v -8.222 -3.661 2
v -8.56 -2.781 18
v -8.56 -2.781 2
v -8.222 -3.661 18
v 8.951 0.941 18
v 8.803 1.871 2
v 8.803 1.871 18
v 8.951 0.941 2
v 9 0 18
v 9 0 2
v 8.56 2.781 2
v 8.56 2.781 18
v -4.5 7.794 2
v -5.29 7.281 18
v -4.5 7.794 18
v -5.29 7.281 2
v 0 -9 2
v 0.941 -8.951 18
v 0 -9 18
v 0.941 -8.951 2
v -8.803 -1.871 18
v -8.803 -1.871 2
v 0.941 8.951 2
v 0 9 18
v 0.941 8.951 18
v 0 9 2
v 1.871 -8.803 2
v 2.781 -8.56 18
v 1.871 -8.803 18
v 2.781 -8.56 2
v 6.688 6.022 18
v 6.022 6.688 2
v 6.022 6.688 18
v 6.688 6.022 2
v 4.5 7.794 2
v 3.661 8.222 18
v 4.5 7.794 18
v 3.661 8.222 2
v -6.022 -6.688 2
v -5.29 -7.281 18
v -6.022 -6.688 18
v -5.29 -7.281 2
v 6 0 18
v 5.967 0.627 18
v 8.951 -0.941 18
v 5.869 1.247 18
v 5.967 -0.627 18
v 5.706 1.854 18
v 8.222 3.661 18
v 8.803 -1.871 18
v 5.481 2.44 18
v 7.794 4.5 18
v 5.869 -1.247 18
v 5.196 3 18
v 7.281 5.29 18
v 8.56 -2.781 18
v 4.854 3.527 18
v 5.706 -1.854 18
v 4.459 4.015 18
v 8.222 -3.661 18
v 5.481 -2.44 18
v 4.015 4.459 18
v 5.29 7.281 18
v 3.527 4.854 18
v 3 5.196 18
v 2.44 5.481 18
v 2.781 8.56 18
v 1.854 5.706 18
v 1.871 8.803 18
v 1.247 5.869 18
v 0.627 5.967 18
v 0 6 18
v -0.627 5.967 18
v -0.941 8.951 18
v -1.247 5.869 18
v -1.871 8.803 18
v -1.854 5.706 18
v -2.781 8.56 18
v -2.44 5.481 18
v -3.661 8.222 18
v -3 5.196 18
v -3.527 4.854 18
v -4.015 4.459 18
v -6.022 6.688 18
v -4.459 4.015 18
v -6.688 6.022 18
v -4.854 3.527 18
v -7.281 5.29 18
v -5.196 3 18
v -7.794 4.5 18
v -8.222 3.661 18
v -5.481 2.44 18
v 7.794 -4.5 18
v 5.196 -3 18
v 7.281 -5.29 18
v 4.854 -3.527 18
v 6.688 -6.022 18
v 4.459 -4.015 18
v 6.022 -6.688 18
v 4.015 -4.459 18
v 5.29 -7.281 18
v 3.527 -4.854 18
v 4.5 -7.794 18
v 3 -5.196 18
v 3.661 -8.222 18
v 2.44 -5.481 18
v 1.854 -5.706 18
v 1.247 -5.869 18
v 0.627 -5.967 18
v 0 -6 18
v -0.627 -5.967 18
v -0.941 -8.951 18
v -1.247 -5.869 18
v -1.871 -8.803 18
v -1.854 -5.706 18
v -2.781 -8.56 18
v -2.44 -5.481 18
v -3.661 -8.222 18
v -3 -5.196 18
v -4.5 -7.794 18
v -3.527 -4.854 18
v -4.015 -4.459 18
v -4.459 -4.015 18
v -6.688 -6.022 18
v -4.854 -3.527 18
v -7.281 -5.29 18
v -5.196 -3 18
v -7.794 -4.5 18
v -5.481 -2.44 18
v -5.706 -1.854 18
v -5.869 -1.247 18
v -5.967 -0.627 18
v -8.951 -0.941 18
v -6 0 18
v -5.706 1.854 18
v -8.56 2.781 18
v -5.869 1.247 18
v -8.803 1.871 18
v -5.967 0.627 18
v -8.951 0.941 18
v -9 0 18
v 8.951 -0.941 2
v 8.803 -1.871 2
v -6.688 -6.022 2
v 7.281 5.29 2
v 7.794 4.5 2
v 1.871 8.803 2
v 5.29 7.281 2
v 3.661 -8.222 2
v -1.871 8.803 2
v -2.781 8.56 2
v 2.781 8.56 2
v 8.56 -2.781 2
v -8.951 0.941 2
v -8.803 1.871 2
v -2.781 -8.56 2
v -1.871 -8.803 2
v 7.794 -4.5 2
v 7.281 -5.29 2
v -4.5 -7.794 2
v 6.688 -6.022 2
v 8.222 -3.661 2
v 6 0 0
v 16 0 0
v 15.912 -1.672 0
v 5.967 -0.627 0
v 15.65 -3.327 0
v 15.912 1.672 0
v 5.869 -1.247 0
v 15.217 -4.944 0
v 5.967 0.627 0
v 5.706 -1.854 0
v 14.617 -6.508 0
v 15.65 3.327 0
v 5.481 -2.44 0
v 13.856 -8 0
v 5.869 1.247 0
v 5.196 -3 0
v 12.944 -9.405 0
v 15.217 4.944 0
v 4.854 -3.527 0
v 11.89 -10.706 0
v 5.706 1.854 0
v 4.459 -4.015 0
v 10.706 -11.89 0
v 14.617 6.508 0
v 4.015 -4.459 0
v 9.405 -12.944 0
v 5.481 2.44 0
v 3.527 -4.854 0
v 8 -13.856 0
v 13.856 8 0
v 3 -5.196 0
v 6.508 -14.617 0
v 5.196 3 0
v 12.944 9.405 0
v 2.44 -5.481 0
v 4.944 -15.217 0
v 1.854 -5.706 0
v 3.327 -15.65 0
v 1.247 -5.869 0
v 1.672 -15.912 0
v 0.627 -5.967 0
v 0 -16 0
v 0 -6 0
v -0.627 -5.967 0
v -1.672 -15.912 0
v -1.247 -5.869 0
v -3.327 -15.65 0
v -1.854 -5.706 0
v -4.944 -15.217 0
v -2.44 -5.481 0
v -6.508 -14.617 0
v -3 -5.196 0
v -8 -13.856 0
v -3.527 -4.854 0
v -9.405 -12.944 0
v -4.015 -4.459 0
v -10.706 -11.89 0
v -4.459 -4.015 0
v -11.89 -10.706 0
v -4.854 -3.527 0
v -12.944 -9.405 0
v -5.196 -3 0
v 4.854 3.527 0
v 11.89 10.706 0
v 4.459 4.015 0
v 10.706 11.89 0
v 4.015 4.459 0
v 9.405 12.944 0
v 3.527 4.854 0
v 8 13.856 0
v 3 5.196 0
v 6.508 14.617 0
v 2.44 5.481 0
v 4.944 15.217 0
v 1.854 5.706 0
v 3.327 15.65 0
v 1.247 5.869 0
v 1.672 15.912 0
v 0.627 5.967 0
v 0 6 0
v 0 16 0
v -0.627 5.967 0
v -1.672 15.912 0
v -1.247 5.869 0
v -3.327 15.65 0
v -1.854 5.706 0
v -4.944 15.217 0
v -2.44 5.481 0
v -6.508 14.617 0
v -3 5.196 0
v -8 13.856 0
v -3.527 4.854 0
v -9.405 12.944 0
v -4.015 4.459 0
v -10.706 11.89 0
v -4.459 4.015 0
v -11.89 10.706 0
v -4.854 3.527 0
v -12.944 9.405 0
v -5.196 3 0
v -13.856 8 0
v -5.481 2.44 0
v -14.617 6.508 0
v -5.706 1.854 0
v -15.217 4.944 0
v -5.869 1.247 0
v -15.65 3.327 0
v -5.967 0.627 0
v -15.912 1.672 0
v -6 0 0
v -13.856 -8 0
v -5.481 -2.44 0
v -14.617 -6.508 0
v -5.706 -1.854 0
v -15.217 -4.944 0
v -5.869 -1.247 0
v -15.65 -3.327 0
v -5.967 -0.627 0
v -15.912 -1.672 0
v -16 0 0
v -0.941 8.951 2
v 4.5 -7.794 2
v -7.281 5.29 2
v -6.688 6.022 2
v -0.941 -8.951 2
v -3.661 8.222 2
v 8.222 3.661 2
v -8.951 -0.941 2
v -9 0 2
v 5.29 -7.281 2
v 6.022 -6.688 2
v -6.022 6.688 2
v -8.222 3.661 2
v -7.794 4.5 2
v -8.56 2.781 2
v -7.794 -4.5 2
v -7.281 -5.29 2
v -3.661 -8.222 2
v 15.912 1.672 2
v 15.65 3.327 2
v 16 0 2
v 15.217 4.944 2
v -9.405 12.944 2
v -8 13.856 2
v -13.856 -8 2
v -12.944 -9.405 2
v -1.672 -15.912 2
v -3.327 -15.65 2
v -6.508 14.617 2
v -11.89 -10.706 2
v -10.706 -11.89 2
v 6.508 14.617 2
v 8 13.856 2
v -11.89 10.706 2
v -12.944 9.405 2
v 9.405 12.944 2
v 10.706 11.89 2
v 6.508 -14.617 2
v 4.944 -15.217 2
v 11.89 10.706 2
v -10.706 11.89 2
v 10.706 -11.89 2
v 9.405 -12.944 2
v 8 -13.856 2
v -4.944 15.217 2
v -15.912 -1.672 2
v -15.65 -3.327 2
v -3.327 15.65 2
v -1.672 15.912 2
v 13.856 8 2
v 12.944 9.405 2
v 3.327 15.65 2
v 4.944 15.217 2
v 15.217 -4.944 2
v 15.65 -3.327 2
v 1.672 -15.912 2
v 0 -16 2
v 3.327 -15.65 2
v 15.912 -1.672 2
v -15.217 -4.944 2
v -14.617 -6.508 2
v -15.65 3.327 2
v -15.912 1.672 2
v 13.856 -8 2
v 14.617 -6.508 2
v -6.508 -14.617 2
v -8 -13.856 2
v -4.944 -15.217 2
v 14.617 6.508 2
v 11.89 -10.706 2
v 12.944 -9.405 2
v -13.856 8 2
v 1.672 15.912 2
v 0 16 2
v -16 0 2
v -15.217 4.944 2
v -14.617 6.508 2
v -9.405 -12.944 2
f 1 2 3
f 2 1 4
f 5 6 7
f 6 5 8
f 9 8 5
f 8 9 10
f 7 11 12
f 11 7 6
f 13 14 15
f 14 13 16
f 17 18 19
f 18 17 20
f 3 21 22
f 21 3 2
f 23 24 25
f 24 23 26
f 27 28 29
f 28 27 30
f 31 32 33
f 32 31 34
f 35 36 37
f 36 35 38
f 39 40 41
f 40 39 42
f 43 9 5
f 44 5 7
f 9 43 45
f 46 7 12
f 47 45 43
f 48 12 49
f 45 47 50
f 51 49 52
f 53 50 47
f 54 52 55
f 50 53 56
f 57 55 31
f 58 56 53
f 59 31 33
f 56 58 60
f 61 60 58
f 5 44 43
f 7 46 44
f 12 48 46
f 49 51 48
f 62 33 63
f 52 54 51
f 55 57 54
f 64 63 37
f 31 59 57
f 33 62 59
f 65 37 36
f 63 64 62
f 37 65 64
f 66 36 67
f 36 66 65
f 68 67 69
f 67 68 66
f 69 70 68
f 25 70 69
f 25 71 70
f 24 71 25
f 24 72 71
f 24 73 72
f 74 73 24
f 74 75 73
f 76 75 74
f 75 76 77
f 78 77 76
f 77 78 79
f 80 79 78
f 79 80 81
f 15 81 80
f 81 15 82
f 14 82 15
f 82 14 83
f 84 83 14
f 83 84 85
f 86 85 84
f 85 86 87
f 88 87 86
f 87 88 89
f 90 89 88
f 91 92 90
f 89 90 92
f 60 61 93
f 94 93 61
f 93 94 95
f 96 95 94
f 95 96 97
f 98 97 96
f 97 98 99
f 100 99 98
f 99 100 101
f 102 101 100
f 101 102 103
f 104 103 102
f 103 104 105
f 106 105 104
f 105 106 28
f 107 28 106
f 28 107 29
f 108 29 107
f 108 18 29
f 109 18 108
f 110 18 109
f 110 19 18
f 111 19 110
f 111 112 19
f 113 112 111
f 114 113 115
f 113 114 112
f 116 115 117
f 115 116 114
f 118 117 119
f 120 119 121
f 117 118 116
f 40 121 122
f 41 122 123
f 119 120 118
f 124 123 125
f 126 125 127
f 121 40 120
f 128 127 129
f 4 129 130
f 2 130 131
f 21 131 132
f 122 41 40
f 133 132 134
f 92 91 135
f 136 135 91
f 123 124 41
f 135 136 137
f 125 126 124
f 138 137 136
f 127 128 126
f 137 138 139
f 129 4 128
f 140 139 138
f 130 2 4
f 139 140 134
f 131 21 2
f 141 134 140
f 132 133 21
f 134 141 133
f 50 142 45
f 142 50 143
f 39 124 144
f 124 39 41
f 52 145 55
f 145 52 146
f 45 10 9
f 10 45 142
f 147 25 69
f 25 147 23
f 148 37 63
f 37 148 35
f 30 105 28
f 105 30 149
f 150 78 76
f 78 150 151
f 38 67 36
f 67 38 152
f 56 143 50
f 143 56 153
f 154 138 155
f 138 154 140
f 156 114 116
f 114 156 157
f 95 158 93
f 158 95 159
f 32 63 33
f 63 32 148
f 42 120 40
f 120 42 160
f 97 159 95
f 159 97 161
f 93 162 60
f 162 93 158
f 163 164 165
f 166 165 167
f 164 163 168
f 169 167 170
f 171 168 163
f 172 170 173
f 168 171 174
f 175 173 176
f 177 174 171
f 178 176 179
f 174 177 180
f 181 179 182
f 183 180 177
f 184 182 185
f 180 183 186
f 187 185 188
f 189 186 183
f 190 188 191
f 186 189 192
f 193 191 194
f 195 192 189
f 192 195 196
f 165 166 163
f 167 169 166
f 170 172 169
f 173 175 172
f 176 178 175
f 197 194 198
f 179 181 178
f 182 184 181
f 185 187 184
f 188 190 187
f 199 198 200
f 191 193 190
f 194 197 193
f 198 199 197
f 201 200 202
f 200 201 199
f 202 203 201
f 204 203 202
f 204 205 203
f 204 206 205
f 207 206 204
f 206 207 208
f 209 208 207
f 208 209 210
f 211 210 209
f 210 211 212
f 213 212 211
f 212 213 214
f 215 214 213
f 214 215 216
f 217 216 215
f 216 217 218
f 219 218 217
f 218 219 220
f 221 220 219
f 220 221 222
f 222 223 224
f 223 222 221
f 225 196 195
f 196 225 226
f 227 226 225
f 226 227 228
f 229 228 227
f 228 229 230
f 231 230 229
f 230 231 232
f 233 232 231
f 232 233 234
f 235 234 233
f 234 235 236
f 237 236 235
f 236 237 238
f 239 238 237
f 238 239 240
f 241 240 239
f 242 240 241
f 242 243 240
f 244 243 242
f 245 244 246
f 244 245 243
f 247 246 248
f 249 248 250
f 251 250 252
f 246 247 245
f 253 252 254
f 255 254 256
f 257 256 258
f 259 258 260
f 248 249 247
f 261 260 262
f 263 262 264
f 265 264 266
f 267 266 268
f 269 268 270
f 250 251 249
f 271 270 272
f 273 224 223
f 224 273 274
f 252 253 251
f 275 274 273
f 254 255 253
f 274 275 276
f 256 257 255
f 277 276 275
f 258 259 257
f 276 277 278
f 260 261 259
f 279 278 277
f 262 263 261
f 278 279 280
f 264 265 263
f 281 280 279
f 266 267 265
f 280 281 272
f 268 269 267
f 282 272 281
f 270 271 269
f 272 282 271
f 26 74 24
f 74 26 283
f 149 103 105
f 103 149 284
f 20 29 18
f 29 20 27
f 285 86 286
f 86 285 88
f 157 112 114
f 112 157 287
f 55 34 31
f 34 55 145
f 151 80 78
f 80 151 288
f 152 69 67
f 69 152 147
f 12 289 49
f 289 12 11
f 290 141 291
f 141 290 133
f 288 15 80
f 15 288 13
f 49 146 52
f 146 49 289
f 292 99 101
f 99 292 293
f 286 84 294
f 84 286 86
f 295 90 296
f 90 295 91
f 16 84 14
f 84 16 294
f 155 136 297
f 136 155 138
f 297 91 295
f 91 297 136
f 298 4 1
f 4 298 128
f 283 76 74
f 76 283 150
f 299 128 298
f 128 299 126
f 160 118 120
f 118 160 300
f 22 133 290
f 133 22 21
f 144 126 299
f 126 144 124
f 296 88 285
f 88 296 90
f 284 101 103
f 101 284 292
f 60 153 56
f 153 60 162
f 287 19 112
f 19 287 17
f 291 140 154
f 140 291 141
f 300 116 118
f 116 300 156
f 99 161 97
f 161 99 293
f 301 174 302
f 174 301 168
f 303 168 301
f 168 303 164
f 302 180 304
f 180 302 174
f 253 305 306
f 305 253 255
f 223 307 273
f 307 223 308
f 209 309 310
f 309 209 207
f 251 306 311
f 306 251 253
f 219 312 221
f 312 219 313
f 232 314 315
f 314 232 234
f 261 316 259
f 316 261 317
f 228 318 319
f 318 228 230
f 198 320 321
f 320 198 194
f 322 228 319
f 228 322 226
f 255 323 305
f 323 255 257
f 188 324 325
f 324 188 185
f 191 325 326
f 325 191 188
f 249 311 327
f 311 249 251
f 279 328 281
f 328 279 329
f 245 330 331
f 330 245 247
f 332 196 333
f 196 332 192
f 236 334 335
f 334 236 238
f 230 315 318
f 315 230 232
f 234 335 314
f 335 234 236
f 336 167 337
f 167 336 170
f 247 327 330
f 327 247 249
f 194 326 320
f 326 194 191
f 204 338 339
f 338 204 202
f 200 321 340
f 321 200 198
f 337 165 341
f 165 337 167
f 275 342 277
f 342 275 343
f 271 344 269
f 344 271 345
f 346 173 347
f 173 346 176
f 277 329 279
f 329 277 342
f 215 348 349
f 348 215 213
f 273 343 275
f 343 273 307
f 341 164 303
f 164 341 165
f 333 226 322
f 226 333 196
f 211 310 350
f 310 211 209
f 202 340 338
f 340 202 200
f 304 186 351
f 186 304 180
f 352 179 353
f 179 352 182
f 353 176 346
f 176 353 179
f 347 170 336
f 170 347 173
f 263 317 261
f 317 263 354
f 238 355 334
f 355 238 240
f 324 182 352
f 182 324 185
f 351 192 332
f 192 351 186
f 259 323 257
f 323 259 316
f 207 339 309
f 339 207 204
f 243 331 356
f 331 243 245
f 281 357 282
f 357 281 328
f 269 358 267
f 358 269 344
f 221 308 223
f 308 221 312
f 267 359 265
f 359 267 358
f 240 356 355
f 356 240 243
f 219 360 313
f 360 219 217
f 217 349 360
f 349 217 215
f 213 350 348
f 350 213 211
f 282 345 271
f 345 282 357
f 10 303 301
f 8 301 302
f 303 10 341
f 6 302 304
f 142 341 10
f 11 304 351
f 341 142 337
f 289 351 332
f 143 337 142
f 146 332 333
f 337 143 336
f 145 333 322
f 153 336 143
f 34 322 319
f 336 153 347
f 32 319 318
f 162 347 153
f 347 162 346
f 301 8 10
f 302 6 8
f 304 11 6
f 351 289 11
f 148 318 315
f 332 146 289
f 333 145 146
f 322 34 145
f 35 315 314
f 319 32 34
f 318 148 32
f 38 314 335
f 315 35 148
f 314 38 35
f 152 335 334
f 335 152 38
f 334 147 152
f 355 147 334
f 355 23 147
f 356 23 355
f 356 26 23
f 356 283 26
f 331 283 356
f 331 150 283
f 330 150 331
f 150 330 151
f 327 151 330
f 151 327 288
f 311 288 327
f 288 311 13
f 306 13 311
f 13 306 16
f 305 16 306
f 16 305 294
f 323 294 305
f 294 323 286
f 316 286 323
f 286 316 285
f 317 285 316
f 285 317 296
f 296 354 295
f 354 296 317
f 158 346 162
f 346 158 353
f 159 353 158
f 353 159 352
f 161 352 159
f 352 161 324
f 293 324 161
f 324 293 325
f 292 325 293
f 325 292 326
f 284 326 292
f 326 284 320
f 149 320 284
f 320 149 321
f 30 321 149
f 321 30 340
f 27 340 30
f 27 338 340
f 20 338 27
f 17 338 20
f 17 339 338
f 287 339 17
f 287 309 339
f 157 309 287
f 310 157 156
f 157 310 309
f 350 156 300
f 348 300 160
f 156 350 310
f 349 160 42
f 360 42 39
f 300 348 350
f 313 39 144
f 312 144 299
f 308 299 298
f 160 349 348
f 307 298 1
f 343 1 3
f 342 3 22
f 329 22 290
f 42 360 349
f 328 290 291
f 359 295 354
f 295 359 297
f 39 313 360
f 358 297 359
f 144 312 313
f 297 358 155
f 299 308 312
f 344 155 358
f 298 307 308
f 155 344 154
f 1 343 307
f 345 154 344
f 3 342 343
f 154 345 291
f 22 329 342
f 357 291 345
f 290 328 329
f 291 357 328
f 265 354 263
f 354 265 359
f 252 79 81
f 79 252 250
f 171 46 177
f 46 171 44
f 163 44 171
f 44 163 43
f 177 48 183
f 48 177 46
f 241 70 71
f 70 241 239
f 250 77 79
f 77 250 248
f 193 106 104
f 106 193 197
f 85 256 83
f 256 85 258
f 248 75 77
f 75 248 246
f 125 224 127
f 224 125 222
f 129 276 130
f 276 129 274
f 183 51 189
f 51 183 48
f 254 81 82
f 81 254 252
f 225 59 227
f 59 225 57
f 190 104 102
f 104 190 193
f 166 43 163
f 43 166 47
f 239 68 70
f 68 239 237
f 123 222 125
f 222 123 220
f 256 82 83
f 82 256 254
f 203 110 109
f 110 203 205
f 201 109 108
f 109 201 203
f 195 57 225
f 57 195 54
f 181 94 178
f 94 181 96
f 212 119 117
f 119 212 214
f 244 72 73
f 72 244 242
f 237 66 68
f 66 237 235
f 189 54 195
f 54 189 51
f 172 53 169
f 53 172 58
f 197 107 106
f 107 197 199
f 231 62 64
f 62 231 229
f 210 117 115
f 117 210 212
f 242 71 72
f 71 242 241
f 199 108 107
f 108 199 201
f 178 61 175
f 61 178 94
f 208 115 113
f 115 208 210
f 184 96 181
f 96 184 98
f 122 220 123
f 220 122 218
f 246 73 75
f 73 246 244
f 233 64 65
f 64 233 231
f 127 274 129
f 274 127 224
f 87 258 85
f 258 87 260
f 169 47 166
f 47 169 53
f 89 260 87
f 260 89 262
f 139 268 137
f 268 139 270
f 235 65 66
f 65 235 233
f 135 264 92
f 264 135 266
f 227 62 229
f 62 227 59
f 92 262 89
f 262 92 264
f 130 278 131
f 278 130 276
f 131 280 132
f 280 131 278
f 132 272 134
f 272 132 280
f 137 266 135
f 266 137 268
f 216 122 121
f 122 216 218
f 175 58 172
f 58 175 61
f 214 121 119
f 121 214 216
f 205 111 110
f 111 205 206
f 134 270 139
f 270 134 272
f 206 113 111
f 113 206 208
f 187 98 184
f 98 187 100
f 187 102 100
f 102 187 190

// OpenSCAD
// Flanged spacer.
$fn = 60;
eps = 0.02;
inner_d = 12;
outer_d = 18;
length = 18;
flange_d = 32;
difference() { union() { cylinder(d=outer_d,h=length); cylinder(d=flange_d,h=2); } translate([0,0,-eps]) cylinder(d=inner_d,h=length+2*eps); }
